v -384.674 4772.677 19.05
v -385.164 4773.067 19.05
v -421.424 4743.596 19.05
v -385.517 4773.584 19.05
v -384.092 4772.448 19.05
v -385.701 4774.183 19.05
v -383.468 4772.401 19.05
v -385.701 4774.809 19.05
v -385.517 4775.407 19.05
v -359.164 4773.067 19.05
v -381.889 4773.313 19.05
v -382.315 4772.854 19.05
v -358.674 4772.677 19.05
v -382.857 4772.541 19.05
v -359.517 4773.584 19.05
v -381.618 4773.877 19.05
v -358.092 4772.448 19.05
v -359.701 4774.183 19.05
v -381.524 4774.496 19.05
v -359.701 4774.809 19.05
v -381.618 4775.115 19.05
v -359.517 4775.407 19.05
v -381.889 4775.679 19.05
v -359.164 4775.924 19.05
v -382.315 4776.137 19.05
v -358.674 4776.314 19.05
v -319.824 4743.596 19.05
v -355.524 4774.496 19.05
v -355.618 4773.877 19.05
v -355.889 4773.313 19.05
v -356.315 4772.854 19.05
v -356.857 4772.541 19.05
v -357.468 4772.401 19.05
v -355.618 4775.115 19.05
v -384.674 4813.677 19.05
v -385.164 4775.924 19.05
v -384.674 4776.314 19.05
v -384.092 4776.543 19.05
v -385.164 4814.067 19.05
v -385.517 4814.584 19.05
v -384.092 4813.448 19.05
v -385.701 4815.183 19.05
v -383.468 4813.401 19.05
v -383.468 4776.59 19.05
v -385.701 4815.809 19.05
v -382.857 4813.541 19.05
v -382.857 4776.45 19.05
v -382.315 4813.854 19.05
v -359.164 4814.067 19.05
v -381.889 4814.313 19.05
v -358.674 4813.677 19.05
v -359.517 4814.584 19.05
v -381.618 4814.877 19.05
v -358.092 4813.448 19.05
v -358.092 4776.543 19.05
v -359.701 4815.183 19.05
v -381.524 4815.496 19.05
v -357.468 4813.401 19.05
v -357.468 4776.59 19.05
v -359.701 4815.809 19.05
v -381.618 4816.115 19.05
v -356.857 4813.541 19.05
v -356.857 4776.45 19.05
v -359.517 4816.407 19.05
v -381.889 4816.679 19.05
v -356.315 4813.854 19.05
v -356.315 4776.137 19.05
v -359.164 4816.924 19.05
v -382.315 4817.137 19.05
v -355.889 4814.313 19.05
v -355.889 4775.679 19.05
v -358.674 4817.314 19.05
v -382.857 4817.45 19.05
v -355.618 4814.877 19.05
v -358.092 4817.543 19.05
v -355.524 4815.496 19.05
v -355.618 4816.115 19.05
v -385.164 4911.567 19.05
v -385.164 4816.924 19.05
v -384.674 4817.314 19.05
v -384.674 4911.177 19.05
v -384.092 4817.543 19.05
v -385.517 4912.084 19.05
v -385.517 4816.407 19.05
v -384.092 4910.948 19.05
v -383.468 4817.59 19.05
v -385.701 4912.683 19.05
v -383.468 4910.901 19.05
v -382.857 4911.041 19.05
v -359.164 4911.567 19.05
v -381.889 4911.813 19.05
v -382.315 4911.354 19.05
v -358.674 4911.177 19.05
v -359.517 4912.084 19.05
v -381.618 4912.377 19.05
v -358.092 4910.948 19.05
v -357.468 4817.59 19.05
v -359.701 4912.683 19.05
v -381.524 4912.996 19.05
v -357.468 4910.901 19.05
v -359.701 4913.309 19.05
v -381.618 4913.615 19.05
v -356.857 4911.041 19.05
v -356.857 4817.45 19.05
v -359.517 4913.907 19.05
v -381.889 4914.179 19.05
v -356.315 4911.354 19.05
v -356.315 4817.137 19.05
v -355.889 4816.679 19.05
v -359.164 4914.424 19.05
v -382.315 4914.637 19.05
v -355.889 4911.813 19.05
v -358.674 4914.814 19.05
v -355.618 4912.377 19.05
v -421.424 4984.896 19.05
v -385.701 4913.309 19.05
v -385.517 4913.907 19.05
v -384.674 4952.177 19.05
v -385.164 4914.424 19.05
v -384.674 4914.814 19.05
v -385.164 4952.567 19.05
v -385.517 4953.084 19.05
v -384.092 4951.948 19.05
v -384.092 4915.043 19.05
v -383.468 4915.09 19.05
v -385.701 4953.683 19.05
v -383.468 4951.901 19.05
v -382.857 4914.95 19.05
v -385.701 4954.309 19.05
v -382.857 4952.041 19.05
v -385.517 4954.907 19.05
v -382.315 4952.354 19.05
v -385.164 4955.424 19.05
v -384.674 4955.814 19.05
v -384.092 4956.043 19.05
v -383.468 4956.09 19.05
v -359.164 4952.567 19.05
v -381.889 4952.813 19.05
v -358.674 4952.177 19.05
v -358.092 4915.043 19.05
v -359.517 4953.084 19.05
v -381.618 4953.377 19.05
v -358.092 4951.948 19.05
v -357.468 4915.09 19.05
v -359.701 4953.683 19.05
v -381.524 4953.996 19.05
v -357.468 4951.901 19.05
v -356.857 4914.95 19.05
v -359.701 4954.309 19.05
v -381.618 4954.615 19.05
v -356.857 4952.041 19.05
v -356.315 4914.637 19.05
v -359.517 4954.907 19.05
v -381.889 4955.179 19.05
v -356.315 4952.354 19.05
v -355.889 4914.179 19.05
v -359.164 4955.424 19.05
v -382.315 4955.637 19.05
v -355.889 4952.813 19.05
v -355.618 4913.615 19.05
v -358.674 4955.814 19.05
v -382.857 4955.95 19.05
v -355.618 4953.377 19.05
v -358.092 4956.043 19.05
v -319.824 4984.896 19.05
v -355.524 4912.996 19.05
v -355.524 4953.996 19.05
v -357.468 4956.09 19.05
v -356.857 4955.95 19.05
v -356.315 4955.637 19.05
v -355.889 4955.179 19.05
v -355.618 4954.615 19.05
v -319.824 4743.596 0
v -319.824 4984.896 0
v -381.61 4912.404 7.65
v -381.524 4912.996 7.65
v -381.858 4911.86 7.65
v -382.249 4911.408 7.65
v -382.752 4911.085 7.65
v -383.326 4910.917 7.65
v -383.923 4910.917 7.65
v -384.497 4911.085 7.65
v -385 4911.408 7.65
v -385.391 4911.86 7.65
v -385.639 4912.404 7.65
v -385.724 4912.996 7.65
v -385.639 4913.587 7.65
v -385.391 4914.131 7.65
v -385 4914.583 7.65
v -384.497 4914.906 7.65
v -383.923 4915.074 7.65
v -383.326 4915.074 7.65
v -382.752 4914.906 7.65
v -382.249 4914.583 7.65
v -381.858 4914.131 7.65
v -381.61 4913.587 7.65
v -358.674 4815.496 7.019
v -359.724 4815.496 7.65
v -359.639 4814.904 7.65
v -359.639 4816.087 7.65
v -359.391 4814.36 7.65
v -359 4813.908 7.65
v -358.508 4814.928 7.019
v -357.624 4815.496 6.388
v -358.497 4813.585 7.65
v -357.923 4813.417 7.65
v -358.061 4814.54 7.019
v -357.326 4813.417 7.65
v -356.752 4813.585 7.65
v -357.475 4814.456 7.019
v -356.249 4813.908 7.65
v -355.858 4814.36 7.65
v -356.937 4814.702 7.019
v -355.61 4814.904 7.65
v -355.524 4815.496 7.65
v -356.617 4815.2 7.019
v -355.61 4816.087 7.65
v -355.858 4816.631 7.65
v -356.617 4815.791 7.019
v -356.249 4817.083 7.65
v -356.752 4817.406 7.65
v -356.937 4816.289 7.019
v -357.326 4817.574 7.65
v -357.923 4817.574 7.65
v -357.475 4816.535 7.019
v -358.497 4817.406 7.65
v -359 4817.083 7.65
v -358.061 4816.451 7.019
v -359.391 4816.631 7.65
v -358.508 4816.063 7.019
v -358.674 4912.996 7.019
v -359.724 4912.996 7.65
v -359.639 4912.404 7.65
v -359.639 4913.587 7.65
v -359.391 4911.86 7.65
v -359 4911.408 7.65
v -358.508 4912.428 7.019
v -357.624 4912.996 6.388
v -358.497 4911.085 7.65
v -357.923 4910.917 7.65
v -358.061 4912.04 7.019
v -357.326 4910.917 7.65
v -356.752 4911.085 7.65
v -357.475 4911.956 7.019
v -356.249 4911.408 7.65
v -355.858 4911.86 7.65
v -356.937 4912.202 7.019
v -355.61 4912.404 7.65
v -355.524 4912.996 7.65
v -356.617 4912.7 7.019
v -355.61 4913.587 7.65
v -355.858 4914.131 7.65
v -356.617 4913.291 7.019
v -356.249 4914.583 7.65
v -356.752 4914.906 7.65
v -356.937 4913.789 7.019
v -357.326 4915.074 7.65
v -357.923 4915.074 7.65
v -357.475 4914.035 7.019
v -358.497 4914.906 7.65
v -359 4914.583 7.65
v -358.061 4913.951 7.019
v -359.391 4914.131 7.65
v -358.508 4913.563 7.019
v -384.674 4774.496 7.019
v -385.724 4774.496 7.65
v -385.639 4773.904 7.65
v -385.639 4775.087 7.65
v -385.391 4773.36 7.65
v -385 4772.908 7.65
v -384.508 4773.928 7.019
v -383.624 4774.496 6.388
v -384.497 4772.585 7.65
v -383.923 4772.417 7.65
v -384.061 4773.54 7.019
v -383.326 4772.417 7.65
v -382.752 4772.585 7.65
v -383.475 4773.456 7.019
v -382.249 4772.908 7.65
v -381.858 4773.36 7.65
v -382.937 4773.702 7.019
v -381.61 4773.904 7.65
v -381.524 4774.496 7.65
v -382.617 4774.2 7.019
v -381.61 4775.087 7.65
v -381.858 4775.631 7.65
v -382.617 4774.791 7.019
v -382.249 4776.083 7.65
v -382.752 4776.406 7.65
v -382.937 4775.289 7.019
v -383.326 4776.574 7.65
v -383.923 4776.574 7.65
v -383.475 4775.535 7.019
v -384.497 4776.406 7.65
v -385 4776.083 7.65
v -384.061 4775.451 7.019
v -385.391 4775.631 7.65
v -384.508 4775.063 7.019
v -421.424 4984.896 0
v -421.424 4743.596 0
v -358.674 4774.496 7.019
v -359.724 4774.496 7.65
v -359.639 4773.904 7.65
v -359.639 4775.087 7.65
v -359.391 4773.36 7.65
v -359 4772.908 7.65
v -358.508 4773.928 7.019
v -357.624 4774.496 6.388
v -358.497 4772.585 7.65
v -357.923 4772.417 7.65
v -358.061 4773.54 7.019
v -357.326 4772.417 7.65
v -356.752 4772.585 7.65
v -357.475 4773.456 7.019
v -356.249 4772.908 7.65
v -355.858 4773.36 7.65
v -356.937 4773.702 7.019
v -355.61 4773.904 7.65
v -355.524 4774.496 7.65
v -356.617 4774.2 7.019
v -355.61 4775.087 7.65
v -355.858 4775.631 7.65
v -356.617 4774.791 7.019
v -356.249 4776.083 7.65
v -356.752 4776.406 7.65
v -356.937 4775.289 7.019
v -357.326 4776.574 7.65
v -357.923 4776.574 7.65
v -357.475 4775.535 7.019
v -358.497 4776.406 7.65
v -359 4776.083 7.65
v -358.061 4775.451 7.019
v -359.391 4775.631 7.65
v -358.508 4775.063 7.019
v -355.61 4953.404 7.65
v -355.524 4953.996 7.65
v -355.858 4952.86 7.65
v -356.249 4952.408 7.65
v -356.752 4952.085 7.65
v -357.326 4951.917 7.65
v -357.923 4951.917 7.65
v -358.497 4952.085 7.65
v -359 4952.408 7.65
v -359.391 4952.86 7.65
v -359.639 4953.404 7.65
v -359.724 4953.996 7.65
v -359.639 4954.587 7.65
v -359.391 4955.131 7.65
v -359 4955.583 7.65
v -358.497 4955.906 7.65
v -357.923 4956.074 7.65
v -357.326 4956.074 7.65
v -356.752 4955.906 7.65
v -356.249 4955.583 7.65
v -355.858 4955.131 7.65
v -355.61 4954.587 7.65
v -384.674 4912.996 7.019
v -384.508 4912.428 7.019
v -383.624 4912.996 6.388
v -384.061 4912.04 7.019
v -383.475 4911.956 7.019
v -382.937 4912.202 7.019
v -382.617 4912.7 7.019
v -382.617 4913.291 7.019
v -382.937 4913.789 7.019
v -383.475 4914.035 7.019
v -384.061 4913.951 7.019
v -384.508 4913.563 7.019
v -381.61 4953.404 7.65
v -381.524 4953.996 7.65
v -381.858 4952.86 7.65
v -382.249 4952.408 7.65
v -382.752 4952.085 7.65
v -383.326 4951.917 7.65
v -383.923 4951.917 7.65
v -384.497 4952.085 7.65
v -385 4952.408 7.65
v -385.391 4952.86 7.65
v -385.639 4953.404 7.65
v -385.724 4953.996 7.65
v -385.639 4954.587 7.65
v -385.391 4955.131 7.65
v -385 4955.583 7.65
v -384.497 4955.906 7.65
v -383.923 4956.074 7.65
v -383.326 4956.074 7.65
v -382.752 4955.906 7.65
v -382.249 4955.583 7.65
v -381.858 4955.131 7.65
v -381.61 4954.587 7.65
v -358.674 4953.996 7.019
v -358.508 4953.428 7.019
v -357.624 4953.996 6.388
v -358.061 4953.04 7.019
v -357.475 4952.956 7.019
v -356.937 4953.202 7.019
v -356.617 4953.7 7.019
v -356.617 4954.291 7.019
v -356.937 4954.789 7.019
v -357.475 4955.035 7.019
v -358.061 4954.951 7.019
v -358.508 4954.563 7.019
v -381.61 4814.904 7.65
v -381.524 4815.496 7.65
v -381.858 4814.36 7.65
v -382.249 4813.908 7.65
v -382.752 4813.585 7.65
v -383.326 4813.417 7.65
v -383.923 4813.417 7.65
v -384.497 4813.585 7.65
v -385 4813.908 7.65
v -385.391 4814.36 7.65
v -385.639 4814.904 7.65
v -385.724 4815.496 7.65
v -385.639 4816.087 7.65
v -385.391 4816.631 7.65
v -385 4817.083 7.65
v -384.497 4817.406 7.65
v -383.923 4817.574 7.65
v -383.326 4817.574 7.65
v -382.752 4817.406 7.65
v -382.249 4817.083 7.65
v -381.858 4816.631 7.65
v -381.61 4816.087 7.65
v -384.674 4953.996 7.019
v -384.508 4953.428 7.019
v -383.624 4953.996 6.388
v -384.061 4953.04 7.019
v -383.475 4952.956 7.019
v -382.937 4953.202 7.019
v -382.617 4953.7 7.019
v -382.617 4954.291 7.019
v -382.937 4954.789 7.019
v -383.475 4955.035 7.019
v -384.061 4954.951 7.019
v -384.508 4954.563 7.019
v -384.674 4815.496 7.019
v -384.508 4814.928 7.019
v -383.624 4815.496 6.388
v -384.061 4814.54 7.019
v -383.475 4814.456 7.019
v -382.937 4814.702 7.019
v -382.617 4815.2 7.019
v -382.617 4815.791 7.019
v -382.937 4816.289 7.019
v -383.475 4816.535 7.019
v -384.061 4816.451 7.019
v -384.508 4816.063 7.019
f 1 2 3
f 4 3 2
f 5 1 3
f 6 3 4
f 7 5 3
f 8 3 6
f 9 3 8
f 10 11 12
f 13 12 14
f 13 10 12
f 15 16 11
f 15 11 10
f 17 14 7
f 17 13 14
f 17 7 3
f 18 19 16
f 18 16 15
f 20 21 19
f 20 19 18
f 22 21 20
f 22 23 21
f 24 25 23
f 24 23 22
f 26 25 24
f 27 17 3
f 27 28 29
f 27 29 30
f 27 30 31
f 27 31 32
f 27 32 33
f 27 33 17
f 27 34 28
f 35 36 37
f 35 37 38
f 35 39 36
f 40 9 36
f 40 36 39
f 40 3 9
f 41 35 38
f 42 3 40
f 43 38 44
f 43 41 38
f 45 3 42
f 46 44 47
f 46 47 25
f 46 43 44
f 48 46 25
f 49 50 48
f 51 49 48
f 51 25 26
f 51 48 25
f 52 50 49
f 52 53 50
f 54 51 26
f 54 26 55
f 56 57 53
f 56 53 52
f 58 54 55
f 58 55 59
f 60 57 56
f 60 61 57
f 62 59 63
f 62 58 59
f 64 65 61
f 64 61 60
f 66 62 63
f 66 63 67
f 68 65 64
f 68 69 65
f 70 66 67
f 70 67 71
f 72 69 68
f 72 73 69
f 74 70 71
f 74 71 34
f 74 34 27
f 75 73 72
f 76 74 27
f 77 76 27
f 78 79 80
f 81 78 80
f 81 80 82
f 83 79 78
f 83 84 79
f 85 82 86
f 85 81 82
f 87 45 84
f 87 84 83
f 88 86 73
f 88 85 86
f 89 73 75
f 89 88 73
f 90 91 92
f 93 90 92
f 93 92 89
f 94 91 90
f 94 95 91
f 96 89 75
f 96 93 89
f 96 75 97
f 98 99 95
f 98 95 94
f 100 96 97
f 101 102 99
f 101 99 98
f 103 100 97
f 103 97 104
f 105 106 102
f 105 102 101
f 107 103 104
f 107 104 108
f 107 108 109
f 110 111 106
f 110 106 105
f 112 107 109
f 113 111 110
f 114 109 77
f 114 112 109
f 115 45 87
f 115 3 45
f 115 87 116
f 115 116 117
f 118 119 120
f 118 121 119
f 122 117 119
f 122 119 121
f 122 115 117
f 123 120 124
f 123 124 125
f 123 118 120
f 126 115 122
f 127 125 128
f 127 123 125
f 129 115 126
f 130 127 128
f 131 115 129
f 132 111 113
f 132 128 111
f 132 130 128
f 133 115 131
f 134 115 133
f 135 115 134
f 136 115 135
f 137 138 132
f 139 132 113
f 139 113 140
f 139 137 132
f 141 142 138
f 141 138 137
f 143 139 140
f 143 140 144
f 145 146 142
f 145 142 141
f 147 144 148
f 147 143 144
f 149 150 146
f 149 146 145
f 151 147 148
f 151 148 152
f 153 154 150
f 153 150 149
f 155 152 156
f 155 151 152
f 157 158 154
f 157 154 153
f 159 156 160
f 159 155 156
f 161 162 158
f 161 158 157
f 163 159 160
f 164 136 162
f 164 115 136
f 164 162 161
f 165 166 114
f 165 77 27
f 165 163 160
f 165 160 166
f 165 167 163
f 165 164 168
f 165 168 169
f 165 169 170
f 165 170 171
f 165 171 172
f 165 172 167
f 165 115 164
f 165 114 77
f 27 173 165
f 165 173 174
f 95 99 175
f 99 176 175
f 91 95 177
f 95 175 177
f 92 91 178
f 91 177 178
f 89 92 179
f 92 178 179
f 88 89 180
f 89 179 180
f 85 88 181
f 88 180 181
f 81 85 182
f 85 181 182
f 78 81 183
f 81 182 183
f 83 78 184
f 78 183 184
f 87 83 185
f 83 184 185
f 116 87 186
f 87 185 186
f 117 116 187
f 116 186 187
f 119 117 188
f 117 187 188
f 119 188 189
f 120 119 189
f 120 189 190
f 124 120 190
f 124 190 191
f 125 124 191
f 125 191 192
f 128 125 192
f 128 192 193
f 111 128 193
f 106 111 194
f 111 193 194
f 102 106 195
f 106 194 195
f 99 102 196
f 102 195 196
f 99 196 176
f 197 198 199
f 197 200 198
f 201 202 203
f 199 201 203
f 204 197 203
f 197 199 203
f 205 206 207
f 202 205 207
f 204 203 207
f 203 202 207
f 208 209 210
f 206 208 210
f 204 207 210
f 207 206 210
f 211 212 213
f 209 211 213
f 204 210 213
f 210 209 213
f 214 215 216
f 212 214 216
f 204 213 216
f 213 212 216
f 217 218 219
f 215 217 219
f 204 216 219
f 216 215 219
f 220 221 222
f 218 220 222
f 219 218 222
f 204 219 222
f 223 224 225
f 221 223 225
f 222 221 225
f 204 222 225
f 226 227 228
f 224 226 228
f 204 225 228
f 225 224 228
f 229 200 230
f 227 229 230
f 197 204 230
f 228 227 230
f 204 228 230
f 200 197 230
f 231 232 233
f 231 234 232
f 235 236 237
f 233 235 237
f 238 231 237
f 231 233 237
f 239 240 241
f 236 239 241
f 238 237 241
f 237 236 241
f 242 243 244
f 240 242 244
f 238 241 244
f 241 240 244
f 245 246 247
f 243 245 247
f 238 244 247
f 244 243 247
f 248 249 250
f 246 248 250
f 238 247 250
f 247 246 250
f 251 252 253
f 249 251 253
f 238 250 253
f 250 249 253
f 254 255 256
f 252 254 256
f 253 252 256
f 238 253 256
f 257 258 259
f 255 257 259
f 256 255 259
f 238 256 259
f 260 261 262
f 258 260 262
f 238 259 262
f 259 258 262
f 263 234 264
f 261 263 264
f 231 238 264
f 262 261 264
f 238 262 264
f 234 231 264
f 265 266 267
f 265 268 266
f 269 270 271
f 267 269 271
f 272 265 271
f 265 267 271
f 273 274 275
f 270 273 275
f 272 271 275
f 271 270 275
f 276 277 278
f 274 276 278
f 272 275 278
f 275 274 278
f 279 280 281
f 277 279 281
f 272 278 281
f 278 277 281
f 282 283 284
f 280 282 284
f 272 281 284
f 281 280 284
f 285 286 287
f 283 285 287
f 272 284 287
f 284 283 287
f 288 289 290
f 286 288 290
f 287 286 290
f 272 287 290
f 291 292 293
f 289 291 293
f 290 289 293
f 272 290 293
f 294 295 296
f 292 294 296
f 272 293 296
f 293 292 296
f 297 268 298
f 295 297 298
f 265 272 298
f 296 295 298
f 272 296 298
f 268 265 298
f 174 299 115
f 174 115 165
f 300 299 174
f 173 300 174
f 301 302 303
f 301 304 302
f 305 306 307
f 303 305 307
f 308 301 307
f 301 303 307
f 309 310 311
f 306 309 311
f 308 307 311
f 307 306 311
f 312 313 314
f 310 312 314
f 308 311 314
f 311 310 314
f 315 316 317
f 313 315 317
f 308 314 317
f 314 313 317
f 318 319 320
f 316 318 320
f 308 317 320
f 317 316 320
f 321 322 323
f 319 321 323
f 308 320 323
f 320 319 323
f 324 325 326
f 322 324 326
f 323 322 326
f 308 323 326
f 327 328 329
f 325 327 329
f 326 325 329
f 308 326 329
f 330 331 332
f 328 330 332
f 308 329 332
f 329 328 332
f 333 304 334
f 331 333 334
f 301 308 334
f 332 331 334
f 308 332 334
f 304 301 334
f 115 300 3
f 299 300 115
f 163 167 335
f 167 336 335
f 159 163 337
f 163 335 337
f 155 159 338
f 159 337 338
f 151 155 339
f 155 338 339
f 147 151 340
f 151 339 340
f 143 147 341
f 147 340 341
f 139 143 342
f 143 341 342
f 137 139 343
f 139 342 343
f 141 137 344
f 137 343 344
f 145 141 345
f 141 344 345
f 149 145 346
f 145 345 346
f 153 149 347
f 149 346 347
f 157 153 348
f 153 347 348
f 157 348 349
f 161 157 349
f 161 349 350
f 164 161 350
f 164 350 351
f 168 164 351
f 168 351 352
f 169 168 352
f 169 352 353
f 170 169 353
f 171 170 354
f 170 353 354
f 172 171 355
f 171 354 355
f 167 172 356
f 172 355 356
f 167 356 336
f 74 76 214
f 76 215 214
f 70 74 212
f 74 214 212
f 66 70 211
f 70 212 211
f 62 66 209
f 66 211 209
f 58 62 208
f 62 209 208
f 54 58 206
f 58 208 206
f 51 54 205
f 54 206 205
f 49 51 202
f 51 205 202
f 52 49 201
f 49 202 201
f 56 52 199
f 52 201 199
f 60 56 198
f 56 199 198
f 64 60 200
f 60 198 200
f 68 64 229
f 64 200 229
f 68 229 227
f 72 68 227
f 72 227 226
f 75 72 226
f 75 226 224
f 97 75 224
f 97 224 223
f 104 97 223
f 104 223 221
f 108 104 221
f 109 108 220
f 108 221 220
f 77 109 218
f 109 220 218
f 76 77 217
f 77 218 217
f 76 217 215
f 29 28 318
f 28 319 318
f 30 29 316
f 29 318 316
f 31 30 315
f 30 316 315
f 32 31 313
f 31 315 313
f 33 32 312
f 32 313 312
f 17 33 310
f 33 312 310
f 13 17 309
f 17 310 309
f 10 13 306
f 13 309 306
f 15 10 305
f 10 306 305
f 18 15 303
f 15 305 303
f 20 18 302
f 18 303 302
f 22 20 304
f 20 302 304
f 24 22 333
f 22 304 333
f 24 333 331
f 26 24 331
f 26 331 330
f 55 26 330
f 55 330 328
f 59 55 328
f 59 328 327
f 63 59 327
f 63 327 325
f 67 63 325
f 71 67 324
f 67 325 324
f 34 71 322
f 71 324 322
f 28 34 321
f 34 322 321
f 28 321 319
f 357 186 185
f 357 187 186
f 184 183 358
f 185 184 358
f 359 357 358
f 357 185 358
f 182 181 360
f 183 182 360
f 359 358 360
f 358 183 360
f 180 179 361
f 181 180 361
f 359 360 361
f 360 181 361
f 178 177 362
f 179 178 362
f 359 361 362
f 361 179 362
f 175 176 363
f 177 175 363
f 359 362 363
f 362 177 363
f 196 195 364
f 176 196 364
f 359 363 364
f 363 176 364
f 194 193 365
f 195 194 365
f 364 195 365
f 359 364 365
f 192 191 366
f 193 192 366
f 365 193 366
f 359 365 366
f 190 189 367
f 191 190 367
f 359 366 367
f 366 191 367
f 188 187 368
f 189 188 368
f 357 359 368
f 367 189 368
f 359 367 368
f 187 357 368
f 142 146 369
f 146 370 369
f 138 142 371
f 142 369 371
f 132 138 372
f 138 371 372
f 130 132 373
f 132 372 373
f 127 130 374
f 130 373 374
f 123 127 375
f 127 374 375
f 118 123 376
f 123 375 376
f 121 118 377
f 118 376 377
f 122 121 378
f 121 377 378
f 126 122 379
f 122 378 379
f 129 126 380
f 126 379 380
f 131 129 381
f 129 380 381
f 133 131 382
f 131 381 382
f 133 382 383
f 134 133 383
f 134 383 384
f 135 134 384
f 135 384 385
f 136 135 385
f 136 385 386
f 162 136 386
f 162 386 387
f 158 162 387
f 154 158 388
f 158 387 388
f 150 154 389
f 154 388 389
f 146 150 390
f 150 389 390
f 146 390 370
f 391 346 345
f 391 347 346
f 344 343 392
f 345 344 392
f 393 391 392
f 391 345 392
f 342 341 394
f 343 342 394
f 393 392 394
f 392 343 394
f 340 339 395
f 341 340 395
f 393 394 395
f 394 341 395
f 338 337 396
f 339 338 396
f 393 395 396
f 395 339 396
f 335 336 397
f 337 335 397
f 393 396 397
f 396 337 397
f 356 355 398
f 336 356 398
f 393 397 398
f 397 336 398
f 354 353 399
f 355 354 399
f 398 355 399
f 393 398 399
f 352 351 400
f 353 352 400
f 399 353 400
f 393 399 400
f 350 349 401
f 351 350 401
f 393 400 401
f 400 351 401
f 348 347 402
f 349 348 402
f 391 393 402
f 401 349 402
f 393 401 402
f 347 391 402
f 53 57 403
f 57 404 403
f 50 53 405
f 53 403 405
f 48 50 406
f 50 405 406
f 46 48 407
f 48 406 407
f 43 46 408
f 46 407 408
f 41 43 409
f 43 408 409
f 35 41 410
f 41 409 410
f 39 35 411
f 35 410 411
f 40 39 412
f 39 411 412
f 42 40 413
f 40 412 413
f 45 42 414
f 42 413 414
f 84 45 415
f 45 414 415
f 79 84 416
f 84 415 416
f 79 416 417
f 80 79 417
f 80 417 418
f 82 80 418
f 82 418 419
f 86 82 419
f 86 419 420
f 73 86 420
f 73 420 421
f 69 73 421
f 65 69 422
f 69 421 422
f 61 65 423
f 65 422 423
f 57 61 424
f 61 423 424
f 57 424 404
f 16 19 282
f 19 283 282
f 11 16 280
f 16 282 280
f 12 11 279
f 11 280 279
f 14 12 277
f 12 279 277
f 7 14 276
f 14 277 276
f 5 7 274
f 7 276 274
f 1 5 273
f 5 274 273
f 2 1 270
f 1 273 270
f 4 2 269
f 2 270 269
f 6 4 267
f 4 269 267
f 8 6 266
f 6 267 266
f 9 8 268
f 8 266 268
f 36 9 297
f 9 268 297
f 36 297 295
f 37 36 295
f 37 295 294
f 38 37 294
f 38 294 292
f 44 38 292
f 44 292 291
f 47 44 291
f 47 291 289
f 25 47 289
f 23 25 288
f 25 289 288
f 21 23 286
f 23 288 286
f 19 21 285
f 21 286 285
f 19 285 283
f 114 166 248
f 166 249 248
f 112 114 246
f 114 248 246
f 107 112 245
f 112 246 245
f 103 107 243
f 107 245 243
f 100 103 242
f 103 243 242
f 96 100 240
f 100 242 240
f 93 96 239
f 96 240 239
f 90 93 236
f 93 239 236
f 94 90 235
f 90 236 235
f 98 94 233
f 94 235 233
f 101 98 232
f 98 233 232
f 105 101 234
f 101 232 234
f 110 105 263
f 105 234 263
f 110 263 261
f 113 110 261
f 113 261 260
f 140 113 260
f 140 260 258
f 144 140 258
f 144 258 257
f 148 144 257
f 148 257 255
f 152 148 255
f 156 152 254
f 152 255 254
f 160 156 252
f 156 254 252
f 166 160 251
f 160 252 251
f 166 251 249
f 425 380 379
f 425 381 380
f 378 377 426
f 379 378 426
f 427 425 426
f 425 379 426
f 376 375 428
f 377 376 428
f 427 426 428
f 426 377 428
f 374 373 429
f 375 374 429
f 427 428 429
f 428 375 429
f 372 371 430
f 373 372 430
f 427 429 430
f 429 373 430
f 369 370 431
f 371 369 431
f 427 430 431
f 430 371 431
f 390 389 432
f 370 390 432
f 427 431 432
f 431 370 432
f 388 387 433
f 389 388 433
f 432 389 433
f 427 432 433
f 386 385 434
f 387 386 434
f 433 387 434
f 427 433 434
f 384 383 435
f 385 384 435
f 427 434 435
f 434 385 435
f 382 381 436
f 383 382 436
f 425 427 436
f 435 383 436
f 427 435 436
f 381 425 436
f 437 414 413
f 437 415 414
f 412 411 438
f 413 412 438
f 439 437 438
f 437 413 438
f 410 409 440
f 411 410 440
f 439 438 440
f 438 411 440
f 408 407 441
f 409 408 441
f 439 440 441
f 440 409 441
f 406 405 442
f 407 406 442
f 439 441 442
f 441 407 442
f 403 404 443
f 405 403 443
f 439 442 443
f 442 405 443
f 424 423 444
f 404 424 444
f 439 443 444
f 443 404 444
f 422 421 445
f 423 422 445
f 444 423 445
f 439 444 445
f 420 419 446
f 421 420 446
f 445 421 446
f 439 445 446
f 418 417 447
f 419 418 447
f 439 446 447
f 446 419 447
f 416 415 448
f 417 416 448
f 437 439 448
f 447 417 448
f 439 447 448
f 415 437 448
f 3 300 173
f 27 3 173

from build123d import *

# Parameters (mm, degrees)
SKETCH1_W                        = 101.6
SKETCH1_H                        = 241.3
BOSS_EXTRUDE1_DEPTH              = 19.05
TAP_DRILL_FOR_M4_HELICOIL0_D     = 4.2
TAP_DRILL_FOR_M4_HELICOIL0_DEPTH = 11.4000026
TAP_DRILL_FOR_M4_HELICOIL0_TIP   = 1.2618073


with BuildPart() as part:
    # Sketch1 → Boss-Extrude1 (new body)
    with BuildSketch(Plane(origin=(0, 4848.835870432, 0), x_dir=(1, 0, 0), z_dir=(0, 0, 1))):
        with Locations((-370.62448934, 15.409688746)):
            Rectangle(SKETCH1_W, SKETCH1_H)
    extrude(amount=BOSS_EXTRUDE1_DEPTH)

    # Tap Drill for M4 Helicoil0
    with Locations(Plane(origin=(0, 0, 19.05), x_dir=(-1, 0, 0), z_dir=(0, 0, 1))):
        with Locations((383.62448934, -4912.995559179), (357.624489341, -4912.995559179), (357.62448934, -4953.995559179), (383.62448934, -4953.995559179), (383.624489341, -4774.495559179), (383.624489341, -4815.495559179), (357.624489341, -4815.495559179), (357.62448934, -4774.495559179)):
            Hole(TAP_DRILL_FOR_M4_HELICOIL0_D / 2, depth=TAP_DRILL_FOR_M4_HELICOIL0_DEPTH)
            with Locations((0, 0, -(TAP_DRILL_FOR_M4_HELICOIL0_DEPTH + TAP_DRILL_FOR_M4_HELICOIL0_TIP / 2))):  # 118° drill point
                Cone(0, TAP_DRILL_FOR_M4_HELICOIL0_D / 2, TAP_DRILL_FOR_M4_HELICOIL0_TIP, mode=Mode.SUBTRACT)


solid = part.part
